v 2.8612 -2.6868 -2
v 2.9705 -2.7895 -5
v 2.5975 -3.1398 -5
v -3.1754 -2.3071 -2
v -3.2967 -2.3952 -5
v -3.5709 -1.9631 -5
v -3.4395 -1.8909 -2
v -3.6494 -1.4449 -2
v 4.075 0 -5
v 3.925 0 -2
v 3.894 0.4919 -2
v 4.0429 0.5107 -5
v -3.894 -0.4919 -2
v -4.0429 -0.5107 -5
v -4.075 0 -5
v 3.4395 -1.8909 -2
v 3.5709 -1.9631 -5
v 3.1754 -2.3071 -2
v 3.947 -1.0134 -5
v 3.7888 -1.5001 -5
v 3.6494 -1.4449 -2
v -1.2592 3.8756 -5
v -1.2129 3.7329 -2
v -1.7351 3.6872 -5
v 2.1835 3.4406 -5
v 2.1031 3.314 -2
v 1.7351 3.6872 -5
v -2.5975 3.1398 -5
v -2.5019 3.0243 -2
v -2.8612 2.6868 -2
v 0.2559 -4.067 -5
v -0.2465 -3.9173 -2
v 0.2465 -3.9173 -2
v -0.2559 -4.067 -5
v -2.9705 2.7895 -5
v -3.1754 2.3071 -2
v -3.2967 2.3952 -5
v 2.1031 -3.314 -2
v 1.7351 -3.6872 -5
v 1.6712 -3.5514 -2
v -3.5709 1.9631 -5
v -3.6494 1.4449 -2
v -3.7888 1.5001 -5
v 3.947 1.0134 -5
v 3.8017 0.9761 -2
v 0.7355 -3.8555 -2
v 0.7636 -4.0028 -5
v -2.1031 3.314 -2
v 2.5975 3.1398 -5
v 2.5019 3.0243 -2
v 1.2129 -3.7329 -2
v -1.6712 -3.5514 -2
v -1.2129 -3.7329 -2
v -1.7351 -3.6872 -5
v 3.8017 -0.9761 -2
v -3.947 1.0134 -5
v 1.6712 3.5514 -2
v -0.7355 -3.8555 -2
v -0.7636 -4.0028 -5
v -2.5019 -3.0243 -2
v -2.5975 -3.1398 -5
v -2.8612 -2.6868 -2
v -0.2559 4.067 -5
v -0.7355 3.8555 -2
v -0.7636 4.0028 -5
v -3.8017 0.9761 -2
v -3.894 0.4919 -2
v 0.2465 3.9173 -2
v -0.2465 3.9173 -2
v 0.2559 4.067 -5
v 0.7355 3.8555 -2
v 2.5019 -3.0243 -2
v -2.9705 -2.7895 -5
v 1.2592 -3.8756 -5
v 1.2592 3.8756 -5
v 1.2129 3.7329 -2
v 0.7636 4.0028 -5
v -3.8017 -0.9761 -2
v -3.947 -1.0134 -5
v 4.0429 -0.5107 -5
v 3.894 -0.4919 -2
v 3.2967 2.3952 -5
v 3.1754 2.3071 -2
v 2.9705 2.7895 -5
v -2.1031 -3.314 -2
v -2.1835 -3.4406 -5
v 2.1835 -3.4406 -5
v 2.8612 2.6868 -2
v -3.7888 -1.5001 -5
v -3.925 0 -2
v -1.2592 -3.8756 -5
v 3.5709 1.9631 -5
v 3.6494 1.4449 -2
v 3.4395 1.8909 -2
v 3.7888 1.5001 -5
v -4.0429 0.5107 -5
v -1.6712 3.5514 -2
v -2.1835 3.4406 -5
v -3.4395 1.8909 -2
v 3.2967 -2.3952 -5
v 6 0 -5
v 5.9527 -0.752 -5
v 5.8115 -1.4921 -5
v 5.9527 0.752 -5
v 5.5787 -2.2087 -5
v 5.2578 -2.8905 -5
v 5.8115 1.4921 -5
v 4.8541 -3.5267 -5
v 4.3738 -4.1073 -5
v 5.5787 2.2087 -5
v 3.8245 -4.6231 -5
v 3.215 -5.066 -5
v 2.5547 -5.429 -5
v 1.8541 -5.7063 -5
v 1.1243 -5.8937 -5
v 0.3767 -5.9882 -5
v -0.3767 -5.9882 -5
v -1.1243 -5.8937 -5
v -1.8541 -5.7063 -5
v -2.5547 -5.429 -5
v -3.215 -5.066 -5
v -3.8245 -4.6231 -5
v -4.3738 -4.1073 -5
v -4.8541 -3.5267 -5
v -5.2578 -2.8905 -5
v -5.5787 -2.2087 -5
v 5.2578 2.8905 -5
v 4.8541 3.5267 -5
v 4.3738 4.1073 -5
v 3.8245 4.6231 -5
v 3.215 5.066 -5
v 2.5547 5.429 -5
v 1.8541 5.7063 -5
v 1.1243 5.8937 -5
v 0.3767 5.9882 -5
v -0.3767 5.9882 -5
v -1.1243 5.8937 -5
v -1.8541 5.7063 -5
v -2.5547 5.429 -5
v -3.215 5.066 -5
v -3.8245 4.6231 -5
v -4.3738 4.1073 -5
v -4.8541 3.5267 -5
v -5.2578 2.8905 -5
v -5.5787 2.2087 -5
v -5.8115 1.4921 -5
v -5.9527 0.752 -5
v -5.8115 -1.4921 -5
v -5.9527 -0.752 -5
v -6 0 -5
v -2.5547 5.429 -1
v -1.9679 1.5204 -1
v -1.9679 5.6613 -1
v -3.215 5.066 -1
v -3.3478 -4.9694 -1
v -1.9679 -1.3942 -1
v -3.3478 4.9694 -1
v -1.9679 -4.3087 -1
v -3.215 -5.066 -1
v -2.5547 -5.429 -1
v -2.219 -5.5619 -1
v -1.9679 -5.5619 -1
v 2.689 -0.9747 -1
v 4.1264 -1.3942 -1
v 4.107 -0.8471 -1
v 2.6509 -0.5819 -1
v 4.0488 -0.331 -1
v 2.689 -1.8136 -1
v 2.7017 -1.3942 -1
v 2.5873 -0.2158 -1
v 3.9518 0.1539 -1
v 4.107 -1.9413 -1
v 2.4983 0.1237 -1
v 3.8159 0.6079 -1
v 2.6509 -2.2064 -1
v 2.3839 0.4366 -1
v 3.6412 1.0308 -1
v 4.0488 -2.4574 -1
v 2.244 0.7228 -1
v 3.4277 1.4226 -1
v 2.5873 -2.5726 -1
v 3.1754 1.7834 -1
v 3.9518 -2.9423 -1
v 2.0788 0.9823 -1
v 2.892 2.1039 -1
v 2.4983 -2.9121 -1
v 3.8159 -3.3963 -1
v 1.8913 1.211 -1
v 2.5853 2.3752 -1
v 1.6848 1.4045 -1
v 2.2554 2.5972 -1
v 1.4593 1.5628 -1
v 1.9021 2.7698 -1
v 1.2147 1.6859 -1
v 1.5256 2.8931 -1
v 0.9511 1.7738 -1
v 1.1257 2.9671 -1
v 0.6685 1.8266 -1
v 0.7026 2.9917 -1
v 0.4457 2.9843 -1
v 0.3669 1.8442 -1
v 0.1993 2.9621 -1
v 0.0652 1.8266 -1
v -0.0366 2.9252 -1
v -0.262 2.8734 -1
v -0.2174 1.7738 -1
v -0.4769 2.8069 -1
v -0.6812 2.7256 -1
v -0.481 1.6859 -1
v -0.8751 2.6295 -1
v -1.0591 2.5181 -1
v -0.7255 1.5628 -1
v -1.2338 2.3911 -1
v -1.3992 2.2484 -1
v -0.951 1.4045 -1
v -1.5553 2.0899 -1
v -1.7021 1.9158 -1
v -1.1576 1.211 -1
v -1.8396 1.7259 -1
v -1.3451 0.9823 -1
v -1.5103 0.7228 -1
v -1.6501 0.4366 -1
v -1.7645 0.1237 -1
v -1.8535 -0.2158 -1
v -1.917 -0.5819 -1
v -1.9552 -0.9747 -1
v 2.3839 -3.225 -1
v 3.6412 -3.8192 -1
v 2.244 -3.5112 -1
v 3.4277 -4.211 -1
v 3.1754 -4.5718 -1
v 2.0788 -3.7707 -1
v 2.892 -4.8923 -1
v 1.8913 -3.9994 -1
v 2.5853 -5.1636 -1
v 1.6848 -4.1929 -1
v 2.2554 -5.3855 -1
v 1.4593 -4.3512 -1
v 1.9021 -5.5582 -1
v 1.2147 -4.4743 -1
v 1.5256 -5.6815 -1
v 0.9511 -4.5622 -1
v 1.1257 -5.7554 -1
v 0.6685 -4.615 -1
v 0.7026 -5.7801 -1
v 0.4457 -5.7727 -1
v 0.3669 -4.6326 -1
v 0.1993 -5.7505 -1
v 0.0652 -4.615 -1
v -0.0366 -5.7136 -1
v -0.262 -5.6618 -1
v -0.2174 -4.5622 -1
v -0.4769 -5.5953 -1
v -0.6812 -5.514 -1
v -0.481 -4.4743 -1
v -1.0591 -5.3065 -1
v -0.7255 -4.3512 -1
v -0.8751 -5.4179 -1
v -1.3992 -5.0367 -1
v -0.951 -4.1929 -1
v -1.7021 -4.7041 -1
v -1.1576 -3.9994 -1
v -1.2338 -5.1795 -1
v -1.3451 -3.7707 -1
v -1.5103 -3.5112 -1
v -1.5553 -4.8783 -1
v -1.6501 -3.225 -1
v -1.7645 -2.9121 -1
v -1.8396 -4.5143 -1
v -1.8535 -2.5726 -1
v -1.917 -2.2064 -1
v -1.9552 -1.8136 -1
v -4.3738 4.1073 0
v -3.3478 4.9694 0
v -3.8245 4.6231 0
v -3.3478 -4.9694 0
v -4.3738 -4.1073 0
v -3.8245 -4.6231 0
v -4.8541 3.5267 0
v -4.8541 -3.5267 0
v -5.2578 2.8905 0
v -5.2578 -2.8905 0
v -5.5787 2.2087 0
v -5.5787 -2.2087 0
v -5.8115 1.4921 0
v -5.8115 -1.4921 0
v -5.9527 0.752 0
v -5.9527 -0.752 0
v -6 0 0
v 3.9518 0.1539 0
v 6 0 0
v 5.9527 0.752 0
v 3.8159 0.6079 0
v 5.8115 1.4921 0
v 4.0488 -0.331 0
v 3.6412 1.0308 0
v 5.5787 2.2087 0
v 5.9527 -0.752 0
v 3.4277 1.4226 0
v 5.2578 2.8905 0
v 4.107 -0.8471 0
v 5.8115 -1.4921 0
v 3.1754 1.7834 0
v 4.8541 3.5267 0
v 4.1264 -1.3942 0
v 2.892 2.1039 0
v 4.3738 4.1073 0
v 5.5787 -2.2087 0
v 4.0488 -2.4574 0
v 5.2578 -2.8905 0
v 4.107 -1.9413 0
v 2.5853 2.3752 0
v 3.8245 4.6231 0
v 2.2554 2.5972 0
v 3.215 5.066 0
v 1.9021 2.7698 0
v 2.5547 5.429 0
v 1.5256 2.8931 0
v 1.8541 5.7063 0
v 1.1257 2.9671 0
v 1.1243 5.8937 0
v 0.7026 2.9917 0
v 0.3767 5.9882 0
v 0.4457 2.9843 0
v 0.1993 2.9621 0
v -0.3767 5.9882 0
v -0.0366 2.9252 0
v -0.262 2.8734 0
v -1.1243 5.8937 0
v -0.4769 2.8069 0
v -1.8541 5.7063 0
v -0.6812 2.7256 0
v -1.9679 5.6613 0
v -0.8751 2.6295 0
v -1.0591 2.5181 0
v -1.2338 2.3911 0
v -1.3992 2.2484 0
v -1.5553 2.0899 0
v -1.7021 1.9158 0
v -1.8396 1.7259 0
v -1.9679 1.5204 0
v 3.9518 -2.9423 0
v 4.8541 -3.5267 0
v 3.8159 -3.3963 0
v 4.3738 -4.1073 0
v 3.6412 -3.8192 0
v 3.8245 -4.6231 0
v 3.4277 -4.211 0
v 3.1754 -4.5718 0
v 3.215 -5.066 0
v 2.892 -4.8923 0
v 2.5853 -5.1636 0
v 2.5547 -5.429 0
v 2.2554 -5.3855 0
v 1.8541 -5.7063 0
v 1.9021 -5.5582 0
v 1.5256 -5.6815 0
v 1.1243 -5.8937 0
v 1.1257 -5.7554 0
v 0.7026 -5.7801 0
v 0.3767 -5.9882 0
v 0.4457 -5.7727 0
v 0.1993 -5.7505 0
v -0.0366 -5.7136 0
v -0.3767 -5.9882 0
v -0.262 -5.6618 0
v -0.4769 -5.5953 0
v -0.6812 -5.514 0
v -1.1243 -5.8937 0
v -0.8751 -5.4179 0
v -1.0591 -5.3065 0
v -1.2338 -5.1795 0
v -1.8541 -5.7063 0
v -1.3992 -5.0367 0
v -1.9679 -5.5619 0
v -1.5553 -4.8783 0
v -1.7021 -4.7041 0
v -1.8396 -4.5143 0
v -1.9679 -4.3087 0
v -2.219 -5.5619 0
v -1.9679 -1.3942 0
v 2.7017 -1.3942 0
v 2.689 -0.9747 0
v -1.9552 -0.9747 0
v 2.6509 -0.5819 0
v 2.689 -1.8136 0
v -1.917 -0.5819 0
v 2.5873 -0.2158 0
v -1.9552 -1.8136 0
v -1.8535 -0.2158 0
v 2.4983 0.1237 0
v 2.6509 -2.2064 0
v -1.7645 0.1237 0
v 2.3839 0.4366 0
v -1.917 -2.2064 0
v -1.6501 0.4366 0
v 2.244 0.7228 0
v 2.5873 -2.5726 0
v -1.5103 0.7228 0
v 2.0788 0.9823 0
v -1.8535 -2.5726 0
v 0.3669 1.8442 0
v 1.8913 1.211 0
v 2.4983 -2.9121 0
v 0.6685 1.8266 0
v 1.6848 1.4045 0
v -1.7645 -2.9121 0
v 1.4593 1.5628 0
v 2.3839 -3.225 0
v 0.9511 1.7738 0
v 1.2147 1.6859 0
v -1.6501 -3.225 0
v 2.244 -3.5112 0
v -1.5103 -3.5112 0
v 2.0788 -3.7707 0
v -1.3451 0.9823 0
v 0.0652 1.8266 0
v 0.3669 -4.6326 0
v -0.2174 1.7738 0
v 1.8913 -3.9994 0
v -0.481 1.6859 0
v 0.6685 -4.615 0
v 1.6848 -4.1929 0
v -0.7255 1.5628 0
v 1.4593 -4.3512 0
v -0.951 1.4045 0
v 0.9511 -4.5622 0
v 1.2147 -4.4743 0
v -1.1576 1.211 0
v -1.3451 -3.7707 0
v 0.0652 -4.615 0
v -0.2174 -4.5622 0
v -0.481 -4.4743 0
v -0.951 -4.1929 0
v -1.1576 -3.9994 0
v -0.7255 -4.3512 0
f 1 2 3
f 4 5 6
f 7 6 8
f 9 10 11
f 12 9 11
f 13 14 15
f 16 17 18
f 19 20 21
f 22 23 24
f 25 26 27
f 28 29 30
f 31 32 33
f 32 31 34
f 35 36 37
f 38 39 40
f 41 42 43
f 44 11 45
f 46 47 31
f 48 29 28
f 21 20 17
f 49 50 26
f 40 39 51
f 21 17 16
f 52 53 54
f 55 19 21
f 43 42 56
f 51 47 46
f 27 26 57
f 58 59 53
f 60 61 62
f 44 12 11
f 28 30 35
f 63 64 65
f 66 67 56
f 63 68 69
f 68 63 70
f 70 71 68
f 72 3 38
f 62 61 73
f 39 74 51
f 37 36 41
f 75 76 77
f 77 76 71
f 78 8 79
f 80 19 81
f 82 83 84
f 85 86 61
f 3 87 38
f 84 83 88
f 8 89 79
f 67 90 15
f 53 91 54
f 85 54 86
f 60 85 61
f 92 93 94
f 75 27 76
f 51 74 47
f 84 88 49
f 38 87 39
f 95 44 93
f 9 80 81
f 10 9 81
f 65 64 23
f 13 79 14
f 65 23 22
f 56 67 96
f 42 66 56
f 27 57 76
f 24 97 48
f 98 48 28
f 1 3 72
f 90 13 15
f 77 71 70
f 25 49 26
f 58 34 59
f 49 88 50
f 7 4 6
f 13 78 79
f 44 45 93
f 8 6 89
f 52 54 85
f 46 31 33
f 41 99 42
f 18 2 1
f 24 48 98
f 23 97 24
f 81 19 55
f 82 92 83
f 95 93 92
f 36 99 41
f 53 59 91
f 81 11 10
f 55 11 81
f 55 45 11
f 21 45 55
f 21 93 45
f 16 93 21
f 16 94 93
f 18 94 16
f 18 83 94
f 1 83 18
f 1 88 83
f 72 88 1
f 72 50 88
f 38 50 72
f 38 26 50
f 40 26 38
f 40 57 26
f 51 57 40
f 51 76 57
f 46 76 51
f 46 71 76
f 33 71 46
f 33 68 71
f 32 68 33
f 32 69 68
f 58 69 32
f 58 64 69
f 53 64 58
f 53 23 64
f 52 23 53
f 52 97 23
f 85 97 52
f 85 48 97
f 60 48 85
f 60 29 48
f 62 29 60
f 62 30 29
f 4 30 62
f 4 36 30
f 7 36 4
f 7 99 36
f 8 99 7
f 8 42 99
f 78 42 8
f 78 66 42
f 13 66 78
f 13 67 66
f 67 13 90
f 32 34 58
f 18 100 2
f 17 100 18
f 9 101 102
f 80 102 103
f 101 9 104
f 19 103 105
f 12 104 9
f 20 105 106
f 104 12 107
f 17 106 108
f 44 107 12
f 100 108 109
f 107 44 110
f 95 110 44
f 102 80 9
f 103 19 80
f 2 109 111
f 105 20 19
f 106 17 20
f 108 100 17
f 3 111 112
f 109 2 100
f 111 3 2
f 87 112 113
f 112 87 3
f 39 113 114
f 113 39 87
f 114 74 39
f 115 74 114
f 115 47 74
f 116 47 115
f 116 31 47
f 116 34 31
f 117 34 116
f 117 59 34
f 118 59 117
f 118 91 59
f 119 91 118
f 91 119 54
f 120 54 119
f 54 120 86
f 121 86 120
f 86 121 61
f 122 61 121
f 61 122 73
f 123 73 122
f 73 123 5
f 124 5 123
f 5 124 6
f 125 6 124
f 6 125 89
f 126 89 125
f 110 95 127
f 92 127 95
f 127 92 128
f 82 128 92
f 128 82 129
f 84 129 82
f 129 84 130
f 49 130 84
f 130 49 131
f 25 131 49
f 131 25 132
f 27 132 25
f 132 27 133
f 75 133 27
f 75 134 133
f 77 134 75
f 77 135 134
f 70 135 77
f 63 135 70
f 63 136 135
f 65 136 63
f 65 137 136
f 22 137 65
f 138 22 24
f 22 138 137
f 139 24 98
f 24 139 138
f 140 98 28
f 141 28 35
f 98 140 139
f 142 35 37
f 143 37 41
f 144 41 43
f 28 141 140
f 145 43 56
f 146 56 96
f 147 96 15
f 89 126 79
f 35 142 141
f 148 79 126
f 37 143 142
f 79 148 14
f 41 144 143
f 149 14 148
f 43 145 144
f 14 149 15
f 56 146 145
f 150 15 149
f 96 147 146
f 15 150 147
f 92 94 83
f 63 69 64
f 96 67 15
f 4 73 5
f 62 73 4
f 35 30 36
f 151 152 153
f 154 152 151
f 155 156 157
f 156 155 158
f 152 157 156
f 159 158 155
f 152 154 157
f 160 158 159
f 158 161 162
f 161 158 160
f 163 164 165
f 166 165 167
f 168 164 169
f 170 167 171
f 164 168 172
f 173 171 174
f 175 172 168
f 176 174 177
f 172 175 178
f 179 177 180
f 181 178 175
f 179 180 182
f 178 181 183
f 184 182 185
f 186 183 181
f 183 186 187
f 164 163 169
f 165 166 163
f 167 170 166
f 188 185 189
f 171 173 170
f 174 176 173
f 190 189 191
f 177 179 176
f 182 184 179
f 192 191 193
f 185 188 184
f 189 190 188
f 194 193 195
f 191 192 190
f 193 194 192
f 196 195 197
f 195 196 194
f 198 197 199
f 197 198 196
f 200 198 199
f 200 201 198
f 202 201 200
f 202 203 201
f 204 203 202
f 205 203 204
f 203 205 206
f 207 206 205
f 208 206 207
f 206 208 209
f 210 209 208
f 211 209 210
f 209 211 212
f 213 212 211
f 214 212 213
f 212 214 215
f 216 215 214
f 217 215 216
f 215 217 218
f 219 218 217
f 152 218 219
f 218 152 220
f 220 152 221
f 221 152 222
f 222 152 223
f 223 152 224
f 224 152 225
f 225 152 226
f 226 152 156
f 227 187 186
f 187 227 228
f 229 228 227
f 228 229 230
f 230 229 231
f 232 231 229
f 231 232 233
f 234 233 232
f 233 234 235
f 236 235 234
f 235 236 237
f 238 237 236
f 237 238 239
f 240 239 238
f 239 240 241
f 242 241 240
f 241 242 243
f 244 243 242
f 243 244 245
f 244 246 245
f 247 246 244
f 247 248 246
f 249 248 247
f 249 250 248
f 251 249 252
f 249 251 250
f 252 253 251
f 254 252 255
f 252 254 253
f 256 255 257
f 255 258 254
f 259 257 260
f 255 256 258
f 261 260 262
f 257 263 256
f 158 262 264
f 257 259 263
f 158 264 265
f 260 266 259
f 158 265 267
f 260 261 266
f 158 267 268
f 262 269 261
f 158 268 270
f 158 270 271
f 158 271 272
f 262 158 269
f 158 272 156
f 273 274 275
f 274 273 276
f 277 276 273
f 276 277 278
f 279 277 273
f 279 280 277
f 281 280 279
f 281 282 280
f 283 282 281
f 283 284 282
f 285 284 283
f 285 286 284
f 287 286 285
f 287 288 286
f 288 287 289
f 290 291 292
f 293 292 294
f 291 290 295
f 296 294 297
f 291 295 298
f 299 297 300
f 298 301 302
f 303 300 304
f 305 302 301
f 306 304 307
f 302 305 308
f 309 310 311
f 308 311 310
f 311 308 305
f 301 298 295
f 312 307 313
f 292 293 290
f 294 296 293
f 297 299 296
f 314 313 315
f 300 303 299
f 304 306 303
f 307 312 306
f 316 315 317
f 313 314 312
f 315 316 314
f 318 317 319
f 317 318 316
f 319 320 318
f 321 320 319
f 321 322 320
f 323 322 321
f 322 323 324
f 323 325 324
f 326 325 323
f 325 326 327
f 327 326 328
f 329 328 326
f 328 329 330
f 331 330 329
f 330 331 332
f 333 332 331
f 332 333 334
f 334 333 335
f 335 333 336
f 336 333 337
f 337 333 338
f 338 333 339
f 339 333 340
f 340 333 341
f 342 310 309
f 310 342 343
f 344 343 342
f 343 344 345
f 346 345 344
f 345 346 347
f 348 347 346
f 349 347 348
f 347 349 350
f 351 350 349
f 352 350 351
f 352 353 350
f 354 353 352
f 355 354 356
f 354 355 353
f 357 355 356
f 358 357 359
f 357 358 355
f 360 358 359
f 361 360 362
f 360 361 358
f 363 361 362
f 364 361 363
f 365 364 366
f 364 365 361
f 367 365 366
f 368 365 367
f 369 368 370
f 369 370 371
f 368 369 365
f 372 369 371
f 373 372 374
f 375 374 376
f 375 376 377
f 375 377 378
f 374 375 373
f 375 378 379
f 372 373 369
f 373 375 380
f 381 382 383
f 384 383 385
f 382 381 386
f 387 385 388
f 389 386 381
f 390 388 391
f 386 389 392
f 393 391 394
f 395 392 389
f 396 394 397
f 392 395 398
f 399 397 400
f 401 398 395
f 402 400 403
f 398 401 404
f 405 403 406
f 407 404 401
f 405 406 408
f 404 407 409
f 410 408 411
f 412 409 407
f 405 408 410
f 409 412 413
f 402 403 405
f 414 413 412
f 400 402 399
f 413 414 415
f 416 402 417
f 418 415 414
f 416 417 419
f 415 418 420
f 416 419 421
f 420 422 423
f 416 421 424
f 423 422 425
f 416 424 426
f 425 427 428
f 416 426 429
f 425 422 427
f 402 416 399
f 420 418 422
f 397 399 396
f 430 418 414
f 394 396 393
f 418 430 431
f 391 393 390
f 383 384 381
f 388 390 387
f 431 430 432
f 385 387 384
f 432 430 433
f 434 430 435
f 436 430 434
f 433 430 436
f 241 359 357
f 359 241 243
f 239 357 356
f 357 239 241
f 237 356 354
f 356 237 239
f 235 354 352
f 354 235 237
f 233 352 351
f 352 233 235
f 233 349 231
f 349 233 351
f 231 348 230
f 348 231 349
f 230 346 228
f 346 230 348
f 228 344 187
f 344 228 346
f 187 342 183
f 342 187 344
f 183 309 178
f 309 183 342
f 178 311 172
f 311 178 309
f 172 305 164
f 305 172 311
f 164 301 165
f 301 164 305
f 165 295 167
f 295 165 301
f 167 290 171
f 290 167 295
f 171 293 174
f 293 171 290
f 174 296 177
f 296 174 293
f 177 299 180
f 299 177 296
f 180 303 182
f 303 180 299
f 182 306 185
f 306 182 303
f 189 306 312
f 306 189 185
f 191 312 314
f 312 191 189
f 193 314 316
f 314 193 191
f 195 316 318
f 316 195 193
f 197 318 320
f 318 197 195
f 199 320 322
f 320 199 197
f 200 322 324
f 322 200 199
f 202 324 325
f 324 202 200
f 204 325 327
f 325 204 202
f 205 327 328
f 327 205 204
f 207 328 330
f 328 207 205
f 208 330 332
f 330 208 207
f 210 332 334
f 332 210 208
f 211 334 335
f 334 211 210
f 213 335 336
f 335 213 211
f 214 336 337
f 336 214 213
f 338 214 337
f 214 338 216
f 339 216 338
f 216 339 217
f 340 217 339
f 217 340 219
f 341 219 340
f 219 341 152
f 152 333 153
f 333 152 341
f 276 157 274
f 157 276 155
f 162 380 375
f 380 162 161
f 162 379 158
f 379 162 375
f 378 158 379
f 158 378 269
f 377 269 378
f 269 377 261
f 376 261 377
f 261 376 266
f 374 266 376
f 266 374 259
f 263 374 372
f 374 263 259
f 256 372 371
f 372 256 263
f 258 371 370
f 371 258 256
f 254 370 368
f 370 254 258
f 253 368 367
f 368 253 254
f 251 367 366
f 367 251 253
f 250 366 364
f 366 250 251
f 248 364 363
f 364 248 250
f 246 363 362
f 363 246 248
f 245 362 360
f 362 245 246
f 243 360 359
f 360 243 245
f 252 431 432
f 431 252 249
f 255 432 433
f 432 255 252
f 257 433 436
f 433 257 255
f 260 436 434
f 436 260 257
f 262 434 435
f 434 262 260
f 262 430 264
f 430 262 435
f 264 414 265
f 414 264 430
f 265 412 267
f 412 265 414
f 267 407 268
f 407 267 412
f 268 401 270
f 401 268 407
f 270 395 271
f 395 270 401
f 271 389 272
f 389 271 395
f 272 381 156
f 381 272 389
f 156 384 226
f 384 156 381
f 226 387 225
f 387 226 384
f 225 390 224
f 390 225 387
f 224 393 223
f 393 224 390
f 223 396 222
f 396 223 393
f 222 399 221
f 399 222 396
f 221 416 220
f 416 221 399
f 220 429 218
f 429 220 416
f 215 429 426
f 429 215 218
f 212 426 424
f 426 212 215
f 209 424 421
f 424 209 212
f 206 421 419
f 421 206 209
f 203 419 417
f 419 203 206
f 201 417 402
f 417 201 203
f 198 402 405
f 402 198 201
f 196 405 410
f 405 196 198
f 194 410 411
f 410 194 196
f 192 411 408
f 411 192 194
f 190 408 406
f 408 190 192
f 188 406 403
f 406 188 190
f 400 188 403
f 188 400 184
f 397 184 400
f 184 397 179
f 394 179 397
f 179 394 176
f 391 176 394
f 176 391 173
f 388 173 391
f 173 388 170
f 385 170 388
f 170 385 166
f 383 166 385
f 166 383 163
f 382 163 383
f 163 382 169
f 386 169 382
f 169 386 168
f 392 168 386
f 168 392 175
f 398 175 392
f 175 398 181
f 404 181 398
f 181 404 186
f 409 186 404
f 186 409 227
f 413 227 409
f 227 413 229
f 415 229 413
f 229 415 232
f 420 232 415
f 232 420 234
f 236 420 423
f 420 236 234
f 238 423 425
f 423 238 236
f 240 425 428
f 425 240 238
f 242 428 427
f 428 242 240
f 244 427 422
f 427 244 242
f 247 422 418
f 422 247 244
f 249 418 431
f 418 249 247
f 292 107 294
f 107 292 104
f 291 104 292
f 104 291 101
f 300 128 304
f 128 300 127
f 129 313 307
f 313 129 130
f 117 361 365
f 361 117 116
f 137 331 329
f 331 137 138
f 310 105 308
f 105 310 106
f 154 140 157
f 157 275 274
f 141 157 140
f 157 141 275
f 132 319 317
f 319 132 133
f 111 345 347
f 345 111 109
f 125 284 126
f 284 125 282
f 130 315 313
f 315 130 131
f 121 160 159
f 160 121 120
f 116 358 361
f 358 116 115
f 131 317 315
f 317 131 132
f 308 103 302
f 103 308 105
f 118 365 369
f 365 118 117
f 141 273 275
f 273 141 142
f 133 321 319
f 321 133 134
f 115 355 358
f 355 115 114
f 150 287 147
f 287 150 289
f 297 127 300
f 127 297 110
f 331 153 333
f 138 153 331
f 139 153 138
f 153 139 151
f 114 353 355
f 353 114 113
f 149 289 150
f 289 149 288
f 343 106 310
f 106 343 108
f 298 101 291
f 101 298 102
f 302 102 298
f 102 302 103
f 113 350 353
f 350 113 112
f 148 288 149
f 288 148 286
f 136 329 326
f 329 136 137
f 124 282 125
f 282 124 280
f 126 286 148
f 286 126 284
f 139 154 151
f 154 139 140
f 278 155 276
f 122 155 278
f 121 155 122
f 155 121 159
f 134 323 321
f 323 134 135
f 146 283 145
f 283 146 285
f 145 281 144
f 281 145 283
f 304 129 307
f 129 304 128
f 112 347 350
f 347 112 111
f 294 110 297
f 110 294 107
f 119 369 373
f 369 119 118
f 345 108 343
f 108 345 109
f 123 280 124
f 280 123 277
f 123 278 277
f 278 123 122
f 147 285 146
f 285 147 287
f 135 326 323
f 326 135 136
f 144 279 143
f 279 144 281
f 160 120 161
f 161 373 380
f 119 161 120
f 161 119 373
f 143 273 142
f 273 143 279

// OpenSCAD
$fn = 50;

difference() {
	union() {
		translate(v = [0, 0, -5.0]) {
			cylinder(h = 5, r = 6.0);
		}
	}
	union() {
		#translate(v = [0, 0, -5.0]) {
			cylinder(h = 3, r1 = 4.075, r2 = 3.925);
		}
		translate(v = [0, 0, -1]) {
			linear_extrude(height = 1) {
				text(font = "Webdings", halign = "center", size = 11, text = "b", valign = "center");
			}
		}
	}
}
